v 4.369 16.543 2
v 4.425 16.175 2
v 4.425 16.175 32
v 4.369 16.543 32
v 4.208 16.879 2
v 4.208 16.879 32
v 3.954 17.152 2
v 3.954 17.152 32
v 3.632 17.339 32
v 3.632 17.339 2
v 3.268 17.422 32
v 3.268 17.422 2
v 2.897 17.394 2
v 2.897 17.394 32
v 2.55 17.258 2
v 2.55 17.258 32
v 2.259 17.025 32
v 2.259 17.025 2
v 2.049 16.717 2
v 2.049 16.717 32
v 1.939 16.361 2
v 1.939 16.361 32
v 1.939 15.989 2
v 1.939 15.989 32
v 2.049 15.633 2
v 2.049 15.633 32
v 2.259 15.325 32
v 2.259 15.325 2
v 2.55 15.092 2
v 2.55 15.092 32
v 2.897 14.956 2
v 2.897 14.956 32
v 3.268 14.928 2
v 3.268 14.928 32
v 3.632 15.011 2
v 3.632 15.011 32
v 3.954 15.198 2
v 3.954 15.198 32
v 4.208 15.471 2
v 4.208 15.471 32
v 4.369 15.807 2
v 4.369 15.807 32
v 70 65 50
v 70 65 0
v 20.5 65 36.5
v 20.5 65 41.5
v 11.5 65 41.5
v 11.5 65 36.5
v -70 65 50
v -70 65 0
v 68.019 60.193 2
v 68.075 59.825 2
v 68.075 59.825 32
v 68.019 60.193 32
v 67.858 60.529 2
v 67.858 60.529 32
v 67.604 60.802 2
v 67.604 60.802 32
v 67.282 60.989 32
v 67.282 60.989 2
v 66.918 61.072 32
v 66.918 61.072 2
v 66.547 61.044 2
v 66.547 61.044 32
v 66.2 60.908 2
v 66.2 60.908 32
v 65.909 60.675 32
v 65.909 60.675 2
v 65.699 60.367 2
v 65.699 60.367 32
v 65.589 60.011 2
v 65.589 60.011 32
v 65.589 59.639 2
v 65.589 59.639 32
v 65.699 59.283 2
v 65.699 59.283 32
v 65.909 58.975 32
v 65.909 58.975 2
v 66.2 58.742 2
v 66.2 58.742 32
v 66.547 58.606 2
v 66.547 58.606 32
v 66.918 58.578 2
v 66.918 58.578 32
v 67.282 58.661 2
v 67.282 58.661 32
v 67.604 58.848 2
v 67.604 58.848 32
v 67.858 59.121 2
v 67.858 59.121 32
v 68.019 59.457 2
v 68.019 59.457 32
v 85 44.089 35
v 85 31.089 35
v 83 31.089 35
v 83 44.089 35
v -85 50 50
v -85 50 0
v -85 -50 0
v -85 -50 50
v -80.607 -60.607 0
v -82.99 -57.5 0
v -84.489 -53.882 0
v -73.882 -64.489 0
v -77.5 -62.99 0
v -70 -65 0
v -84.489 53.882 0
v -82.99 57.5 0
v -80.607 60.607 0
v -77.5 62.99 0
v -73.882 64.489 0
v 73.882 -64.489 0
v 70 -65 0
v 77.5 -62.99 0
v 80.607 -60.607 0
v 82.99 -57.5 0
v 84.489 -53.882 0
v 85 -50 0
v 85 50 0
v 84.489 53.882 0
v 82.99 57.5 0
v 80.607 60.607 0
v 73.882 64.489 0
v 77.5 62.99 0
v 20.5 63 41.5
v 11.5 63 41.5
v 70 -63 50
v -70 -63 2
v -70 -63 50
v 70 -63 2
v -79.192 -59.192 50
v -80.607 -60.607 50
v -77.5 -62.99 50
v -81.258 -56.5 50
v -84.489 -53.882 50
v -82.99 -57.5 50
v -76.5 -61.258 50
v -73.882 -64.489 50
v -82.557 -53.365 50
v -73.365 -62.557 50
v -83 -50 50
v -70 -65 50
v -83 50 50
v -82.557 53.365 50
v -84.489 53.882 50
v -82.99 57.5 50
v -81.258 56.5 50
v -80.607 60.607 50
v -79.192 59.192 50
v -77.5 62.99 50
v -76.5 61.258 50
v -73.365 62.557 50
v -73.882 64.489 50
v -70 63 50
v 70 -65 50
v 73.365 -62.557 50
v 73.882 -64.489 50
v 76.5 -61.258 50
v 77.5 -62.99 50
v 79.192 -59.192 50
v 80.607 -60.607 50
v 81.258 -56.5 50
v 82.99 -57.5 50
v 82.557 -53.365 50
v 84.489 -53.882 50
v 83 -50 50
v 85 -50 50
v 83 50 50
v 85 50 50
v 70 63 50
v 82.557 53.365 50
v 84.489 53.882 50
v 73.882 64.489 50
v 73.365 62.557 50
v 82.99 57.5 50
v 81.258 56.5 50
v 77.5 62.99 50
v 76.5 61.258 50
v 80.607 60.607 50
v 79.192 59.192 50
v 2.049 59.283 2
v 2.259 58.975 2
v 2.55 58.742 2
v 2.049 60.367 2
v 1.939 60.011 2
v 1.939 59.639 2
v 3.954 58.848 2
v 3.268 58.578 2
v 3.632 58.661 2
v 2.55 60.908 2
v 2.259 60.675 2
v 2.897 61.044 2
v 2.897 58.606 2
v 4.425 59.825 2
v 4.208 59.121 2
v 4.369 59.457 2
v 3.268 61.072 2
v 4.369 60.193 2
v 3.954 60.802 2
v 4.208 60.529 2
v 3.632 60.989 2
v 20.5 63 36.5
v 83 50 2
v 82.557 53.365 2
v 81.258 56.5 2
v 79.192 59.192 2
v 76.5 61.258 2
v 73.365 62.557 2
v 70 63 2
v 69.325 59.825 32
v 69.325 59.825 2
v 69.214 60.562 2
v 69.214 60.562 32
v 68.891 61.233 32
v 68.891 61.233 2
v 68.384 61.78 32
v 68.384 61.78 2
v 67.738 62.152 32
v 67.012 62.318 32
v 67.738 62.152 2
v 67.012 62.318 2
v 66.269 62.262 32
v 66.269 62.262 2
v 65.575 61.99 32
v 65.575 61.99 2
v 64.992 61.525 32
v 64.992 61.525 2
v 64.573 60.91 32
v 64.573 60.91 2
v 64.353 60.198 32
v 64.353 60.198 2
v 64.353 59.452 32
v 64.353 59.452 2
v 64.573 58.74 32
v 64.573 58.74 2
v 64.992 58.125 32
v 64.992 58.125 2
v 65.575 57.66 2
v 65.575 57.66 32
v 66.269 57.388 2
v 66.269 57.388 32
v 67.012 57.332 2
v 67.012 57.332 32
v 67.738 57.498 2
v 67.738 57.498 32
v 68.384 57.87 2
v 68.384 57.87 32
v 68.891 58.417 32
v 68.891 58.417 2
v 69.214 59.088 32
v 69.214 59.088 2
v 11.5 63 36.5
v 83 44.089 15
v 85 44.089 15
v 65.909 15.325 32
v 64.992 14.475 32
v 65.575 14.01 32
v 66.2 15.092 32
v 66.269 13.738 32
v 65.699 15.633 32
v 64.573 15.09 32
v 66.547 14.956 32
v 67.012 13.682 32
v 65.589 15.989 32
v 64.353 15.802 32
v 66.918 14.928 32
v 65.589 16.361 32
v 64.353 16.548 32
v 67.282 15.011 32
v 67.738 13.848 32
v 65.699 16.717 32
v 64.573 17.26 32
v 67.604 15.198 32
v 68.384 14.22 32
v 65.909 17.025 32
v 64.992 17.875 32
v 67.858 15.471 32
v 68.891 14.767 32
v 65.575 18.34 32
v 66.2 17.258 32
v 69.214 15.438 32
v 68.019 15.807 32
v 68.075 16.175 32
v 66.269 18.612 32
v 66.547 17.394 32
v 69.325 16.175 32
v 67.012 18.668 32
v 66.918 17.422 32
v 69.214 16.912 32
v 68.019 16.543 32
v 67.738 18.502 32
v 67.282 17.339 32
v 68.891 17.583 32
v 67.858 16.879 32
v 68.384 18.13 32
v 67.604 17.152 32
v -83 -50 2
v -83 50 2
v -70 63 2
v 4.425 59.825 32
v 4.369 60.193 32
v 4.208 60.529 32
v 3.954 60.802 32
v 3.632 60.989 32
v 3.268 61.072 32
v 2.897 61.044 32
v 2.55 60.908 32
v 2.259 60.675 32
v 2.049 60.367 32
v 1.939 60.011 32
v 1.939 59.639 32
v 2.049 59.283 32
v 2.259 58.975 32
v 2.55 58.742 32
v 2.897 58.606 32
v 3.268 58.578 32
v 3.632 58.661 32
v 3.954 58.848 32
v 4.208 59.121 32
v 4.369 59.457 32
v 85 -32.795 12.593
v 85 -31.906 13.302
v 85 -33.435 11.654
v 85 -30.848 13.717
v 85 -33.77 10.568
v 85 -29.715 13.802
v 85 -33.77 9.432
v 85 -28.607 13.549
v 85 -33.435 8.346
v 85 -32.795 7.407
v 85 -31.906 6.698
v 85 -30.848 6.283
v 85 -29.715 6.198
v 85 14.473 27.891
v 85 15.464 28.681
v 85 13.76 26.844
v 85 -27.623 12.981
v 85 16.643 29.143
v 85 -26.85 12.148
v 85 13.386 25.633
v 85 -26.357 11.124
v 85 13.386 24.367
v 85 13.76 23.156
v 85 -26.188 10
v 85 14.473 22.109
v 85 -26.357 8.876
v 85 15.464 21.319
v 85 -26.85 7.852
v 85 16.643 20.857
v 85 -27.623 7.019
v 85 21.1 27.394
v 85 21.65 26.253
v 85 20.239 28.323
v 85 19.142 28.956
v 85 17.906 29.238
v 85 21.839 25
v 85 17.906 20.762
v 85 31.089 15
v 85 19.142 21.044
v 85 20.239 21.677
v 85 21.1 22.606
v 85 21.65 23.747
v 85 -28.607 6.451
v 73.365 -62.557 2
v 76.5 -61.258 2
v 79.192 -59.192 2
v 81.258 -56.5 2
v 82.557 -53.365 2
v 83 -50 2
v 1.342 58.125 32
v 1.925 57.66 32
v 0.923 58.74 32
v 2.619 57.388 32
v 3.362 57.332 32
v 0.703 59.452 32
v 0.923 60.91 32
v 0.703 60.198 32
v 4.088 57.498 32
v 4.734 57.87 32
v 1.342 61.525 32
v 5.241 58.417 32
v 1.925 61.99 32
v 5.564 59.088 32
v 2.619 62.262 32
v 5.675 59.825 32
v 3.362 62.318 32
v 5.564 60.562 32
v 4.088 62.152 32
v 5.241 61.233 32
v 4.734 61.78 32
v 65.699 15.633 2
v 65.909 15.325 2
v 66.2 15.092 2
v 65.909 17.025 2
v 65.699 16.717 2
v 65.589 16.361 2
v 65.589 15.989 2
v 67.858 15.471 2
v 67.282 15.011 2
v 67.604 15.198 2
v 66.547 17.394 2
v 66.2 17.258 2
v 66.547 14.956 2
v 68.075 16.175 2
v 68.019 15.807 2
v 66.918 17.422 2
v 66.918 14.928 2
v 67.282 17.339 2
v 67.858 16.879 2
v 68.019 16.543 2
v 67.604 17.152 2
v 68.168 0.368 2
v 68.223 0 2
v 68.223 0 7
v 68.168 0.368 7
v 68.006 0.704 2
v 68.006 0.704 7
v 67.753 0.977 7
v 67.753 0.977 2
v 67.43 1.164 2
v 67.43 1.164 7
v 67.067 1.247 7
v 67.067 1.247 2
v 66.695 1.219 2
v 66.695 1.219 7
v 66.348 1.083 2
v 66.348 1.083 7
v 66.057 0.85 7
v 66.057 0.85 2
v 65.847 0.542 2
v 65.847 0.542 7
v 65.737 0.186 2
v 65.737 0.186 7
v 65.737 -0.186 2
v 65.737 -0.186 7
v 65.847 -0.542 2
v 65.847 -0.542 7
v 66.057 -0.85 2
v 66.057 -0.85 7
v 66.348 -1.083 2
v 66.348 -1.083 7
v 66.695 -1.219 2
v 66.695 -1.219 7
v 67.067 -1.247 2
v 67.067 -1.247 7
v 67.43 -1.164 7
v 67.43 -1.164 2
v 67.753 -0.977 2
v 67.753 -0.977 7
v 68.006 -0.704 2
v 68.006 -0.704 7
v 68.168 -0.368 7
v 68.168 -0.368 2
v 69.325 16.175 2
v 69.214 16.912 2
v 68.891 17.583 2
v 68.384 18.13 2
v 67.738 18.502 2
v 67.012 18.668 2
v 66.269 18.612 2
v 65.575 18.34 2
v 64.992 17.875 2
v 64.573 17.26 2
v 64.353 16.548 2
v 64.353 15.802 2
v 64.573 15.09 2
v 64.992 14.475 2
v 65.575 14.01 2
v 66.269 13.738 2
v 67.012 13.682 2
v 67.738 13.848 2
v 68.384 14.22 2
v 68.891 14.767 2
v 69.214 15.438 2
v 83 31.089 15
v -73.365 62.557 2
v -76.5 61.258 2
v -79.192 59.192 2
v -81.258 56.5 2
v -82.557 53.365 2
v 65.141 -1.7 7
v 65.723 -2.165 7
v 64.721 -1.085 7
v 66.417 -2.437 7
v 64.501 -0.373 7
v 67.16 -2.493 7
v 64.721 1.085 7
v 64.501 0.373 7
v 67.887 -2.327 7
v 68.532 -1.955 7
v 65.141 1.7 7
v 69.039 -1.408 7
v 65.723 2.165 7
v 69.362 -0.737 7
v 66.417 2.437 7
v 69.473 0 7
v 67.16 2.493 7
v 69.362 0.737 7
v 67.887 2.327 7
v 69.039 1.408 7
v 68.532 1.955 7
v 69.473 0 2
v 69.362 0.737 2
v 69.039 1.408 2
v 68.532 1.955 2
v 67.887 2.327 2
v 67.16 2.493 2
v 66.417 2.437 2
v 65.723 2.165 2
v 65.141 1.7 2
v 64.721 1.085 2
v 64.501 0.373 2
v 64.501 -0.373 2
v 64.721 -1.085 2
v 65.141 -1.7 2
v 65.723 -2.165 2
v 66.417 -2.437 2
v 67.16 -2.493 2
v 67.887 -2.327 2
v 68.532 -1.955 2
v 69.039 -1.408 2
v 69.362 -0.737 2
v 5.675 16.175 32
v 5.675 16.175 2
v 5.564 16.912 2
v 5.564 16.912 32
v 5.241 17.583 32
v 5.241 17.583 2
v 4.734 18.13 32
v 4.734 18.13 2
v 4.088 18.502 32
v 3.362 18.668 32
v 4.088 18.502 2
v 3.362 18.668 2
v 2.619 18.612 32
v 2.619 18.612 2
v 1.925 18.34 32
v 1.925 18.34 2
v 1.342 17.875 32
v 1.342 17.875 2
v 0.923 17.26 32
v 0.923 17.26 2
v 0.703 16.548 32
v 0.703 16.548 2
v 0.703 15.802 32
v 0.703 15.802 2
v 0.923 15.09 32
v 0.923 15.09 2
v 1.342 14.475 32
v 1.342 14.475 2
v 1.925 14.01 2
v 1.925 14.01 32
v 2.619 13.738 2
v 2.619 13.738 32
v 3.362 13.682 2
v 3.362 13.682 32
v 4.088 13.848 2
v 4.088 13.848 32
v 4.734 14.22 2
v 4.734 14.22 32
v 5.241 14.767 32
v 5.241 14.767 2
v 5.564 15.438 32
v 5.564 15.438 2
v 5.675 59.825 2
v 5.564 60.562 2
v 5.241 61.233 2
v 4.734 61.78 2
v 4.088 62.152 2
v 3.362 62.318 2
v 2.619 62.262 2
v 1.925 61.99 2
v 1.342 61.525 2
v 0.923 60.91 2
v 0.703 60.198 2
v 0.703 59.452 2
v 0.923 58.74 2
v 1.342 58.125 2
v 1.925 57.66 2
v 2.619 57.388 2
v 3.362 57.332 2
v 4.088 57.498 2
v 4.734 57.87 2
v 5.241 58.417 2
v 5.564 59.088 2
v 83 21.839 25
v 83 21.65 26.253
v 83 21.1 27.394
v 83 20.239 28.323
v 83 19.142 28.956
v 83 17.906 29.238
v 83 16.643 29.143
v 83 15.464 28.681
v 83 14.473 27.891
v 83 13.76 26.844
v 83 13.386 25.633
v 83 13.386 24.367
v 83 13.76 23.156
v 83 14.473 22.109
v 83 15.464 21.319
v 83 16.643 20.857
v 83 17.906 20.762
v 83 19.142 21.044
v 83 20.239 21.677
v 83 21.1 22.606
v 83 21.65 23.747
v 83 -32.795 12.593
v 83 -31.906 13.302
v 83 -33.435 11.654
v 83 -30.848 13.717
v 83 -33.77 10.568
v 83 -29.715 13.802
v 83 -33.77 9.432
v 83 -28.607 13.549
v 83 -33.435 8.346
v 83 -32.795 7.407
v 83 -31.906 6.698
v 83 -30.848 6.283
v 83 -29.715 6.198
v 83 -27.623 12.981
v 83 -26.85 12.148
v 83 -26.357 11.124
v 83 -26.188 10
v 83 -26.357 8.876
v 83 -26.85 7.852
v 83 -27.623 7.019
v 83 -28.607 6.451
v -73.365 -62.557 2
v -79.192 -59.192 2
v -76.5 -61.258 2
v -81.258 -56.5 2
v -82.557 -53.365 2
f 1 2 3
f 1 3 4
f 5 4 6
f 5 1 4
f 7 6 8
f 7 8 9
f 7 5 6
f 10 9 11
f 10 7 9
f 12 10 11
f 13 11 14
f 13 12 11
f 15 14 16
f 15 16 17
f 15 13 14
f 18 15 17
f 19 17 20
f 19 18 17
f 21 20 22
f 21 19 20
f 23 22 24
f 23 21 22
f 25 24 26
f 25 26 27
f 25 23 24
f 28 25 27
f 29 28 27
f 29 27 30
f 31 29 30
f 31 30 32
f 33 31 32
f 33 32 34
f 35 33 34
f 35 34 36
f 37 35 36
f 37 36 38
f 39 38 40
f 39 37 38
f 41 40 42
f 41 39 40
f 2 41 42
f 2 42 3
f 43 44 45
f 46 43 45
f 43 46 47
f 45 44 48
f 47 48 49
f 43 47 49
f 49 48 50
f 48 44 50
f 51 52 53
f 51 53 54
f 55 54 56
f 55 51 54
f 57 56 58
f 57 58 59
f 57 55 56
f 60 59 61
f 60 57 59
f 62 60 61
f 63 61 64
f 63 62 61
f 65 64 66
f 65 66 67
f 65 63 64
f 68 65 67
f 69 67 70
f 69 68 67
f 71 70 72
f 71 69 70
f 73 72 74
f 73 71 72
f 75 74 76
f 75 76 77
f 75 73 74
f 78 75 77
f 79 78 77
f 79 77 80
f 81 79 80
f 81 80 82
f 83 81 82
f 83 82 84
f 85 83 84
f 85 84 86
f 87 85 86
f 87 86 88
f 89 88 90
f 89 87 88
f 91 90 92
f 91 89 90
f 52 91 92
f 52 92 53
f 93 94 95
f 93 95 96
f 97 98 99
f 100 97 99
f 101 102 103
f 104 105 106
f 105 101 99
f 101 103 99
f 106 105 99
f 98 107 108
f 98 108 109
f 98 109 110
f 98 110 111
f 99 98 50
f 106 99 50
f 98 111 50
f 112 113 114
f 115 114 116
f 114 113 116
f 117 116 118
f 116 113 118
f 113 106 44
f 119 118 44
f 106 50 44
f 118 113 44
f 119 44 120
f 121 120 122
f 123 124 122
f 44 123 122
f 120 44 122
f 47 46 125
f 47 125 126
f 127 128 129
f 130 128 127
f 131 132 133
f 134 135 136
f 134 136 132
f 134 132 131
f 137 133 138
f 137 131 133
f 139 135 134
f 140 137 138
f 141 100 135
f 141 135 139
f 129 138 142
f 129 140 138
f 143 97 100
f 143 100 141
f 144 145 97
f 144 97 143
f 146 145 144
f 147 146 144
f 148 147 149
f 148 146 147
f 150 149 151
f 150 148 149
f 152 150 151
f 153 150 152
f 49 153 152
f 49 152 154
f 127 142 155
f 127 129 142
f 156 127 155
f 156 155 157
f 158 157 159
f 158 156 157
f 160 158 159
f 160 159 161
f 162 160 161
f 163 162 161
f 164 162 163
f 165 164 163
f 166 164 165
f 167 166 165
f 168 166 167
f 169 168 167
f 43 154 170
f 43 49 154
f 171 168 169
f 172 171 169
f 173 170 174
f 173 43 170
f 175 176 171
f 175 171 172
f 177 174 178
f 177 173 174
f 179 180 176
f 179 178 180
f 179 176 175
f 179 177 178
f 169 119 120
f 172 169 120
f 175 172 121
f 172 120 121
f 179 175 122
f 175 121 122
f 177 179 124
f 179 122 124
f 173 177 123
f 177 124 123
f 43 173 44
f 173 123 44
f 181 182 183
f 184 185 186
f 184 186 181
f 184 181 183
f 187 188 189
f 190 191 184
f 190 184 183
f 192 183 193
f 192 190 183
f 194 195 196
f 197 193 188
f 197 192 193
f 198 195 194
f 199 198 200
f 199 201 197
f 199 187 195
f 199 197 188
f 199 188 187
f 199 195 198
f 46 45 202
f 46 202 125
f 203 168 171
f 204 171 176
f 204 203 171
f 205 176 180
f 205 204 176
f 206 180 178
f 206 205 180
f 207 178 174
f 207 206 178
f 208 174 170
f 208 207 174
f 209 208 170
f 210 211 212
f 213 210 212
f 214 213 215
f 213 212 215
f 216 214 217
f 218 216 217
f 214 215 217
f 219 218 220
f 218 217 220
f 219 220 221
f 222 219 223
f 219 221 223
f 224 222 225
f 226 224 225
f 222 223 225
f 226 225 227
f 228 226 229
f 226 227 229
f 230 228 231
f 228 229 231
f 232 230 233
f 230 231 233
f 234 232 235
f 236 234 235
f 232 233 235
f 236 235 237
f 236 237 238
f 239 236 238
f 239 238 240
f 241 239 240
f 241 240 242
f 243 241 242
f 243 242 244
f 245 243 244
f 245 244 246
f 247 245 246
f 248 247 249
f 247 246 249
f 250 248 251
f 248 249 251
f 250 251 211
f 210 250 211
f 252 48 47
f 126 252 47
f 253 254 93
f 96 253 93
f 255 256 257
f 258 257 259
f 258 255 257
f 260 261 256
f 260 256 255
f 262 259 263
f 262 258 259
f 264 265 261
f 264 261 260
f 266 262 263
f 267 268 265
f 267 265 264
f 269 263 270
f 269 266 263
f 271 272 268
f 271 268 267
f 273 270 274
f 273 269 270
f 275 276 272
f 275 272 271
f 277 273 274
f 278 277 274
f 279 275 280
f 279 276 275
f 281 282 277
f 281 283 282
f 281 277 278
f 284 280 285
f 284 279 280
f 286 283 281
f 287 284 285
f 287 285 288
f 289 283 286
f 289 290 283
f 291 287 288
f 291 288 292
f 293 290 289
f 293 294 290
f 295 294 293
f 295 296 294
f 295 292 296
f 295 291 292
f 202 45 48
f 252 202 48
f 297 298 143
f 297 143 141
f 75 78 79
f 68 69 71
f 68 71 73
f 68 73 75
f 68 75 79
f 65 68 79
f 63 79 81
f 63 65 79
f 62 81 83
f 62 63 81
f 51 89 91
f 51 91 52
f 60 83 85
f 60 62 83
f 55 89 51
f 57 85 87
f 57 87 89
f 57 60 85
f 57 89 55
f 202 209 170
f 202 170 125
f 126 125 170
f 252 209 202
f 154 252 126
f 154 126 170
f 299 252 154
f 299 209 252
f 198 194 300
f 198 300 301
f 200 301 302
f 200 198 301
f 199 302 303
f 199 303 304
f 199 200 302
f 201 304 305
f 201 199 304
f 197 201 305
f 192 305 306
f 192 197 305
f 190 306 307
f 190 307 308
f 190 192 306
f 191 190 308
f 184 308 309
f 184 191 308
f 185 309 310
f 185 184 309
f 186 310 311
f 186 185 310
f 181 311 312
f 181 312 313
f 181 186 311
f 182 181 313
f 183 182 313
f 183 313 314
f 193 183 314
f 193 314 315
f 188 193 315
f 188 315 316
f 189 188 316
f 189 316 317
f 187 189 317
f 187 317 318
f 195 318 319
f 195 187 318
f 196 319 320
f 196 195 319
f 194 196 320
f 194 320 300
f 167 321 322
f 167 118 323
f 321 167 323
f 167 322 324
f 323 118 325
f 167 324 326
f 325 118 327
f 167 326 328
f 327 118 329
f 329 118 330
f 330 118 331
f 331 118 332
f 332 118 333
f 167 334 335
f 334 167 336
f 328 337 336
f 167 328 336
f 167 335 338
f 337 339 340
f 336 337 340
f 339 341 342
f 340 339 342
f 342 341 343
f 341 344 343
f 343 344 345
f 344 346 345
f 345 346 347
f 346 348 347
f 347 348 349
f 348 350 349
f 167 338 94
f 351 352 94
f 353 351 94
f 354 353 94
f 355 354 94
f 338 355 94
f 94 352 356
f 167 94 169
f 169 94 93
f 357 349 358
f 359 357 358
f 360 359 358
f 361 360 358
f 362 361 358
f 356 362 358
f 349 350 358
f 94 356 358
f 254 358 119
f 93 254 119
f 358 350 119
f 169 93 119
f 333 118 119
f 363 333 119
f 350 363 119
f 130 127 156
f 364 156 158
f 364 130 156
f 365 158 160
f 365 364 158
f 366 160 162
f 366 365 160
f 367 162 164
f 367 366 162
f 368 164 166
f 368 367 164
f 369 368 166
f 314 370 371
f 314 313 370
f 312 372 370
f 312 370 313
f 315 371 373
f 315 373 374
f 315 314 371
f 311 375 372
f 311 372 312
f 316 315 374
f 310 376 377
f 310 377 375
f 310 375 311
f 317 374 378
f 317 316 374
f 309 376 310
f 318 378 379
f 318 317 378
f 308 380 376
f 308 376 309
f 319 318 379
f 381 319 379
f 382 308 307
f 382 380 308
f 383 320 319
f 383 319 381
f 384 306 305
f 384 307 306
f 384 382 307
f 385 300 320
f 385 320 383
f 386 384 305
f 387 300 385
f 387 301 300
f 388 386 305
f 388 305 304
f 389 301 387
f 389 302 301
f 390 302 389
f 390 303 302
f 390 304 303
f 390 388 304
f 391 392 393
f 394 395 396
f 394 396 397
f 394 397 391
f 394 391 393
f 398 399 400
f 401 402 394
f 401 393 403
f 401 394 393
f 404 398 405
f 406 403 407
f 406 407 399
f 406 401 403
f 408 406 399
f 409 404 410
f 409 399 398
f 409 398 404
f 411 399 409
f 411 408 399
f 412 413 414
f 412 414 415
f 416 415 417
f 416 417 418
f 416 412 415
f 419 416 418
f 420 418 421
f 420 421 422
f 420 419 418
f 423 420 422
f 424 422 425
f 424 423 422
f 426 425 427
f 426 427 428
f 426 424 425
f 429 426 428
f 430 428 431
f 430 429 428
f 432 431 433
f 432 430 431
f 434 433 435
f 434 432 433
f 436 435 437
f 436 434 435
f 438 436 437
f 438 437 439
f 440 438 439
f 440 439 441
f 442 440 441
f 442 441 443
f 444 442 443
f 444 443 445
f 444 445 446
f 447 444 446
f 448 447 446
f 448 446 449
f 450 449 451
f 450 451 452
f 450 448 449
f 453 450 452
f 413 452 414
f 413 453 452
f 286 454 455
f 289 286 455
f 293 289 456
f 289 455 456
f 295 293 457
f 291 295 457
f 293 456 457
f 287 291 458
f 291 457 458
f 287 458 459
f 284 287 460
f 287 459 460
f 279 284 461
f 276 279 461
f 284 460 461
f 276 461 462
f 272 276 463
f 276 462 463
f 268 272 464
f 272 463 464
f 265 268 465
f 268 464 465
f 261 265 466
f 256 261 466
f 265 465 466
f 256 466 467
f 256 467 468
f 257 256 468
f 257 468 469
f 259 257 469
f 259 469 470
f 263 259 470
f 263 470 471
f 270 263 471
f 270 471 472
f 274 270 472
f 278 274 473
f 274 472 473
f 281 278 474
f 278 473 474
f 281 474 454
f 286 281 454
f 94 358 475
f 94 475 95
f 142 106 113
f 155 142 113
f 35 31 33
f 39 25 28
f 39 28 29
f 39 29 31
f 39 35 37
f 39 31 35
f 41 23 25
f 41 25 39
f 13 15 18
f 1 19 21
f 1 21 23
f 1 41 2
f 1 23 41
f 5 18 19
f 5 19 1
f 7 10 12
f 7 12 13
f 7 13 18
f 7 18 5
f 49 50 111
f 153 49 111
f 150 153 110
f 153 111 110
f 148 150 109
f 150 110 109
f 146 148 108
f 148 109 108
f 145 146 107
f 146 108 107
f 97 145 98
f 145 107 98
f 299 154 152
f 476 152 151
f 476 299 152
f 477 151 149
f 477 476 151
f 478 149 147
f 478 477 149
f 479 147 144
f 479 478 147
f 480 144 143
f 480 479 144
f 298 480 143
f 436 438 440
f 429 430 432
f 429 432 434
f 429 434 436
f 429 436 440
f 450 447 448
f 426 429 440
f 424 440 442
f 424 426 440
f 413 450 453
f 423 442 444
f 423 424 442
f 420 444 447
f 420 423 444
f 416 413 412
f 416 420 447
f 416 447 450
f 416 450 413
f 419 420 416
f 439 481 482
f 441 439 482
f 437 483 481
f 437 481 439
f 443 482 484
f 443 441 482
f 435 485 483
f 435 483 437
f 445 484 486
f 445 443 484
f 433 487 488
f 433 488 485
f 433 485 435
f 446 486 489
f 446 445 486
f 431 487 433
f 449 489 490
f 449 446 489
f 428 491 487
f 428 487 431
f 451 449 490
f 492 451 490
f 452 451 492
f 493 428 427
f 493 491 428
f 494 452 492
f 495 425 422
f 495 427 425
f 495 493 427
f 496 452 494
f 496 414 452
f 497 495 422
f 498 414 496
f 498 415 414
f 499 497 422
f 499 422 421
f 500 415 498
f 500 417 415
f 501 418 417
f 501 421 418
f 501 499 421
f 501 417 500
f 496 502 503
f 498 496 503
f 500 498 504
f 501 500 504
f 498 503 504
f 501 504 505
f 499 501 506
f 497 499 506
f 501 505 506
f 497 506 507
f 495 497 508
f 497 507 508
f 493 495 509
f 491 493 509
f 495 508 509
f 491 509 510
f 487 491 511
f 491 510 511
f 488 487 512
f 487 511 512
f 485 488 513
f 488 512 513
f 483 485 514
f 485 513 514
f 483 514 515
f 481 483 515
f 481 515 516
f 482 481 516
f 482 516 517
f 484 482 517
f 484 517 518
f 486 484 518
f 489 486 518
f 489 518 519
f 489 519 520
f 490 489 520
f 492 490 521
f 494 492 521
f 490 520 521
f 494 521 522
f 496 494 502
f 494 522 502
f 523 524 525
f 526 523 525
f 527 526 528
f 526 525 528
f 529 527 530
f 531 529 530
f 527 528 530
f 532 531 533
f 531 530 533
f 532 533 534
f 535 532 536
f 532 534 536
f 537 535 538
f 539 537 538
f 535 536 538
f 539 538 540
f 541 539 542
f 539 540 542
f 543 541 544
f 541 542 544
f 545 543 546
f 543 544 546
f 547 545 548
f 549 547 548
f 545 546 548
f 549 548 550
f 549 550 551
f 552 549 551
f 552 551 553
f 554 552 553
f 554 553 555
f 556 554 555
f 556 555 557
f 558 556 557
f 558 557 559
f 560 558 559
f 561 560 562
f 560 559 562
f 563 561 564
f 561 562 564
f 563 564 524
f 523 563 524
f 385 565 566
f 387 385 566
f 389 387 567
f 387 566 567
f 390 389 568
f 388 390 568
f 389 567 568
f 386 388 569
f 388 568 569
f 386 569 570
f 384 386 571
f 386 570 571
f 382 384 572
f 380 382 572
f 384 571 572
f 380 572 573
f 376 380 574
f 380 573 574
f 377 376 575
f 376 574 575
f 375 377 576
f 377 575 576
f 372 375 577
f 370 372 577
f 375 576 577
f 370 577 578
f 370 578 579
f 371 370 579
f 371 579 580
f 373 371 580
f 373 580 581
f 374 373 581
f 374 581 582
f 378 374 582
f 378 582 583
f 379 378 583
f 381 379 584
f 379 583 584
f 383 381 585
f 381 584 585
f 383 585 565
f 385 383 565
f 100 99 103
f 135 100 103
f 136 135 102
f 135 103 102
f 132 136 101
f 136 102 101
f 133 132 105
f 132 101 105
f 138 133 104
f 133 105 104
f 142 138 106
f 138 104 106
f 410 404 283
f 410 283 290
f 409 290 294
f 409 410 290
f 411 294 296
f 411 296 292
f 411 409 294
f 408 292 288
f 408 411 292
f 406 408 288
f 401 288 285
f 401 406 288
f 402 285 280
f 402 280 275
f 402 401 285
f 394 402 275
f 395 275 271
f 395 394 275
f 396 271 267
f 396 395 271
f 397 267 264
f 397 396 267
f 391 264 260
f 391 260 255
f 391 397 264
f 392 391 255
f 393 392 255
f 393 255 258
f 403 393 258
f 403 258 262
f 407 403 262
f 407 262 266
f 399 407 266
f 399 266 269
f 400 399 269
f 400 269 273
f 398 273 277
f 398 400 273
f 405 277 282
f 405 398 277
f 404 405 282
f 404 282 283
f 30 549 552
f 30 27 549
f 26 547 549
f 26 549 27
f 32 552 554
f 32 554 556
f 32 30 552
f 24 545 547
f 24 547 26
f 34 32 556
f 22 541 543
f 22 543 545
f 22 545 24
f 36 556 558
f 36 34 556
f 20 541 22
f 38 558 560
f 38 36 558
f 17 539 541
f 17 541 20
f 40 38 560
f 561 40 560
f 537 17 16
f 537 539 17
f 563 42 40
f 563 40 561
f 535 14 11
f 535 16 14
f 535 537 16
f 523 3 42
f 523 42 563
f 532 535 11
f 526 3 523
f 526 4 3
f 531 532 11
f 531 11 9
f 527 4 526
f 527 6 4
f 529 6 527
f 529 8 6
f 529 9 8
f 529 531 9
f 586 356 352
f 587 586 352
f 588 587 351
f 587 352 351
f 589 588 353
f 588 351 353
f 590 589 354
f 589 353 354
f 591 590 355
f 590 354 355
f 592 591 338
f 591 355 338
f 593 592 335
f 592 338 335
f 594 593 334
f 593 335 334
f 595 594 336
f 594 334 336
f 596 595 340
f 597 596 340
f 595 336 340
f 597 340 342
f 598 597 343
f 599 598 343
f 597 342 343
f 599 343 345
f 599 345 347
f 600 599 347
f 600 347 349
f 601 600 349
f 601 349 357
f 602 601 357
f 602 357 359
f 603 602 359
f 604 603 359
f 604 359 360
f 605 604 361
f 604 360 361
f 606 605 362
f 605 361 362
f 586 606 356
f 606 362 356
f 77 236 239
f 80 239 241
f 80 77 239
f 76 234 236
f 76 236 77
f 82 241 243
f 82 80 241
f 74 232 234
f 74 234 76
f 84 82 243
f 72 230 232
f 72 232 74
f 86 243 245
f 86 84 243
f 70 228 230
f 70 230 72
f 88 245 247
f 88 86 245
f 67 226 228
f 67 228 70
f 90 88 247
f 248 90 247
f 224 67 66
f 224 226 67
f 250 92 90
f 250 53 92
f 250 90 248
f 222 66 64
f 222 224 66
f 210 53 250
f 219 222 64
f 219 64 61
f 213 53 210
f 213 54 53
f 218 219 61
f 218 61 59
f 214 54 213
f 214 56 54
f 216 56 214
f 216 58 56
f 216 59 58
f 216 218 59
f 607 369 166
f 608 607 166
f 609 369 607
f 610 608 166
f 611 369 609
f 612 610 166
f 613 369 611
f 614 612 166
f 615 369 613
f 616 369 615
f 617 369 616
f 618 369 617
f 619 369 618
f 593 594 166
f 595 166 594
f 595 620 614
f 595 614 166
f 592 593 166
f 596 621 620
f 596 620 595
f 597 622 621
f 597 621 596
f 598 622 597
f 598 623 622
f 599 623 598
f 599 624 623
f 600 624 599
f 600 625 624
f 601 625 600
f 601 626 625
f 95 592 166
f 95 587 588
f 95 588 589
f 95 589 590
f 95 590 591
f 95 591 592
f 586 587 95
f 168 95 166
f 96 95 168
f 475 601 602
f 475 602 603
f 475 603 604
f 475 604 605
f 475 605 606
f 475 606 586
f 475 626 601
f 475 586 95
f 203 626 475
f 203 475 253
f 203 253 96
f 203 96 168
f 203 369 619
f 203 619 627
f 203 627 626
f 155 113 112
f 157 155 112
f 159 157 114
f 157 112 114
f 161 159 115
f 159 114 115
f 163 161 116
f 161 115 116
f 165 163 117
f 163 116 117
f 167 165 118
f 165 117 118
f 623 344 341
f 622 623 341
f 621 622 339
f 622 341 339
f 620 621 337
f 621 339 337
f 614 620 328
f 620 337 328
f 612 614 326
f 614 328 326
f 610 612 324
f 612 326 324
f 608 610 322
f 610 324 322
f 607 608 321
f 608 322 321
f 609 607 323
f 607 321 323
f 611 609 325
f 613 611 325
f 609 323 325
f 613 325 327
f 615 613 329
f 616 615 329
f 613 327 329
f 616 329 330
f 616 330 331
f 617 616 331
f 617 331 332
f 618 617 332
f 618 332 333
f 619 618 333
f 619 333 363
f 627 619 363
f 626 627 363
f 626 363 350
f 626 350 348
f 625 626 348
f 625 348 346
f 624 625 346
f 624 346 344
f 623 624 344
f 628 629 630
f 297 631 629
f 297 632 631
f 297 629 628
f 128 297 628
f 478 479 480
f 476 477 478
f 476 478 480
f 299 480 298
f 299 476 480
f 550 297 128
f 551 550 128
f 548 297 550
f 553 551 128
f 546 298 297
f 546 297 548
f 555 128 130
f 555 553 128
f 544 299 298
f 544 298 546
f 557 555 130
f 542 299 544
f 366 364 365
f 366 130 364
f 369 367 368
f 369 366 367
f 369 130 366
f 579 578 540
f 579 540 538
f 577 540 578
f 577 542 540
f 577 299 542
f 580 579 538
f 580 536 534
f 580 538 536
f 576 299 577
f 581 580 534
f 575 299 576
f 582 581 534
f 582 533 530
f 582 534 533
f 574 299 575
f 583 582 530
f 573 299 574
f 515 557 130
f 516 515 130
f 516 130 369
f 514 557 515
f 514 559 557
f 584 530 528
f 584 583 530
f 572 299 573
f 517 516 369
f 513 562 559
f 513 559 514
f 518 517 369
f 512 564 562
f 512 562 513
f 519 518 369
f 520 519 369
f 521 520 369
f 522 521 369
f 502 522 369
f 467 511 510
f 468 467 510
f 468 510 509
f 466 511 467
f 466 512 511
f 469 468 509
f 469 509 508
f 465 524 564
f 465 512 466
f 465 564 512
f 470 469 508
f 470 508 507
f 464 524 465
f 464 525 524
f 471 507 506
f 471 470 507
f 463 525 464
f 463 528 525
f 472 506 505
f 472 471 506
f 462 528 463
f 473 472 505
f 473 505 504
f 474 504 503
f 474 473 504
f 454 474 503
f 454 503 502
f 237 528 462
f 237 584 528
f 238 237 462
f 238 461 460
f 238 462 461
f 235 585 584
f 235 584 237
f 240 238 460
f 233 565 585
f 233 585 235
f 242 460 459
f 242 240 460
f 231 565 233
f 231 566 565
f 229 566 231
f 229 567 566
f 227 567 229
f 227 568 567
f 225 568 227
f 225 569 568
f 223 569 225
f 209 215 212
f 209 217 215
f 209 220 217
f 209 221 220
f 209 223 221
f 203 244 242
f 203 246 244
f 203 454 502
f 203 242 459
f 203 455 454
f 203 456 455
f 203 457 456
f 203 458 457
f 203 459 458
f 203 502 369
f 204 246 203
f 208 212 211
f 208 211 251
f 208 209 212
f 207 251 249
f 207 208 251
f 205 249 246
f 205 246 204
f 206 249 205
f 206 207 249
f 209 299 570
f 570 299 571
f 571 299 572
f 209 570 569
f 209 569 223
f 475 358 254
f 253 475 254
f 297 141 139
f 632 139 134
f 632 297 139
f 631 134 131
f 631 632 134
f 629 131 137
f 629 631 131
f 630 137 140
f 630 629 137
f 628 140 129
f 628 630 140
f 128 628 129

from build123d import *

# Parameters (mm, degrees)
F1_DEPTH  = 50
F2_T      = -2
F3_R      = 2.5
F3_R_2    = 1.25
F4_DEPTH  = 30
F5_W      = 9
F5_H      = 5
F6_DEPTH  = 2
F8_R      = 4.25
F8_W      = 13
F8_H      = 20
F9_DEPTH  = 2
F10_R     = 2.5
F10_R_2   = 1.25
F11_DEPTH = 5
F12_R     = 3.8125
F13_DEPTH = 25


with BuildPart() as f1:
    # F0 (on Top) → F1 (new body)
    with BuildSketch(Plane.XY):
        with BuildLine():
            Line((70, 65), (-70, 65))
            ThreePointArc((-70, 65), (-80.606602, 60.606602), (-85, 50))
            Line((-85, 50), (-85, -50))
            ThreePointArc((-85, -50), (-80.606602, -60.606602), (-70, -65))
            Line((-70, -65), (70, -65))
            ThreePointArc((70, -65), (80.606602, -60.606602), (85, -50))
            Line((85, -50), (85, 50))
            ThreePointArc((85, 50), (80.606602, 60.606602), (70, 65))
        make_face()
    extrude(amount=F1_DEPTH)

    # F2
    f2_openings = [f1.faces().sort_by_distance(p)[0] for p in [
        (0, 0, 50),
    ]]
    offset(amount=F2_T, openings=f2_openings)

    # F3 (on face) → F4 (join)
    with BuildSketch(Plane.XY.offset(2)):
        with Locations((3.175, 59.825)):
            Circle(F3_R)
        with Locations((3.175, 59.825)):
            Circle(F3_R_2, mode=Mode.SUBTRACT)
        with Locations((3.175, 16.175)):
            Circle(F3_R)
        with Locations((3.175, 16.175)):
            Circle(F3_R_2, mode=Mode.SUBTRACT)
        with Locations((66.825, 59.825)):
            Circle(F3_R)
        with Locations((66.825, 59.825)):
            Circle(F3_R_2, mode=Mode.SUBTRACT)
        with Locations((66.825, 16.175)):
            Circle(F3_R)
        with Locations((66.825, 16.175)):
            Circle(F3_R_2, mode=Mode.SUBTRACT)
    extrude(amount=F4_DEPTH)

    # F5 (on face) → F6 (cut, through all)
    with BuildSketch(Plane(origin=(0, 65, 0), x_dir=(-1, 0, 0), z_dir=(0, 1, 0))):
        with Locations((-16, 39)):
            Rectangle(F5_W, F5_H)
    extrude(amount=-F6_DEPTH, mode=Mode.SUBTRACT)

    # F8 (on face) → F9 (cut, through all)
    with BuildSketch(Plane.YZ.offset(85)):
        with Locations((17.588826, 25)):
            Circle(F8_R)
        with Locations((37.588826, 25)):
            Rectangle(F8_W, F8_H)
    extrude(amount=-F9_DEPTH, mode=Mode.SUBTRACT)

    # F10 (on face) → F11 (join)
    with BuildSketch(Plane.XY.offset(2)):
        with Locations((66.973306, 0)):
            Circle(F10_R)
        with Locations((66.973306, 0)):
            Circle(F10_R_2, mode=Mode.SUBTRACT)
    extrude(amount=F11_DEPTH)

    # F12 (on face) → F13 (cut)
    with BuildSketch(Plane.YZ.offset(85)):
        with Locations((-30, 10)):
            Circle(F12_R)
    extrude(amount=-F13_DEPTH, mode=Mode.SUBTRACT)


solid = f1.part
